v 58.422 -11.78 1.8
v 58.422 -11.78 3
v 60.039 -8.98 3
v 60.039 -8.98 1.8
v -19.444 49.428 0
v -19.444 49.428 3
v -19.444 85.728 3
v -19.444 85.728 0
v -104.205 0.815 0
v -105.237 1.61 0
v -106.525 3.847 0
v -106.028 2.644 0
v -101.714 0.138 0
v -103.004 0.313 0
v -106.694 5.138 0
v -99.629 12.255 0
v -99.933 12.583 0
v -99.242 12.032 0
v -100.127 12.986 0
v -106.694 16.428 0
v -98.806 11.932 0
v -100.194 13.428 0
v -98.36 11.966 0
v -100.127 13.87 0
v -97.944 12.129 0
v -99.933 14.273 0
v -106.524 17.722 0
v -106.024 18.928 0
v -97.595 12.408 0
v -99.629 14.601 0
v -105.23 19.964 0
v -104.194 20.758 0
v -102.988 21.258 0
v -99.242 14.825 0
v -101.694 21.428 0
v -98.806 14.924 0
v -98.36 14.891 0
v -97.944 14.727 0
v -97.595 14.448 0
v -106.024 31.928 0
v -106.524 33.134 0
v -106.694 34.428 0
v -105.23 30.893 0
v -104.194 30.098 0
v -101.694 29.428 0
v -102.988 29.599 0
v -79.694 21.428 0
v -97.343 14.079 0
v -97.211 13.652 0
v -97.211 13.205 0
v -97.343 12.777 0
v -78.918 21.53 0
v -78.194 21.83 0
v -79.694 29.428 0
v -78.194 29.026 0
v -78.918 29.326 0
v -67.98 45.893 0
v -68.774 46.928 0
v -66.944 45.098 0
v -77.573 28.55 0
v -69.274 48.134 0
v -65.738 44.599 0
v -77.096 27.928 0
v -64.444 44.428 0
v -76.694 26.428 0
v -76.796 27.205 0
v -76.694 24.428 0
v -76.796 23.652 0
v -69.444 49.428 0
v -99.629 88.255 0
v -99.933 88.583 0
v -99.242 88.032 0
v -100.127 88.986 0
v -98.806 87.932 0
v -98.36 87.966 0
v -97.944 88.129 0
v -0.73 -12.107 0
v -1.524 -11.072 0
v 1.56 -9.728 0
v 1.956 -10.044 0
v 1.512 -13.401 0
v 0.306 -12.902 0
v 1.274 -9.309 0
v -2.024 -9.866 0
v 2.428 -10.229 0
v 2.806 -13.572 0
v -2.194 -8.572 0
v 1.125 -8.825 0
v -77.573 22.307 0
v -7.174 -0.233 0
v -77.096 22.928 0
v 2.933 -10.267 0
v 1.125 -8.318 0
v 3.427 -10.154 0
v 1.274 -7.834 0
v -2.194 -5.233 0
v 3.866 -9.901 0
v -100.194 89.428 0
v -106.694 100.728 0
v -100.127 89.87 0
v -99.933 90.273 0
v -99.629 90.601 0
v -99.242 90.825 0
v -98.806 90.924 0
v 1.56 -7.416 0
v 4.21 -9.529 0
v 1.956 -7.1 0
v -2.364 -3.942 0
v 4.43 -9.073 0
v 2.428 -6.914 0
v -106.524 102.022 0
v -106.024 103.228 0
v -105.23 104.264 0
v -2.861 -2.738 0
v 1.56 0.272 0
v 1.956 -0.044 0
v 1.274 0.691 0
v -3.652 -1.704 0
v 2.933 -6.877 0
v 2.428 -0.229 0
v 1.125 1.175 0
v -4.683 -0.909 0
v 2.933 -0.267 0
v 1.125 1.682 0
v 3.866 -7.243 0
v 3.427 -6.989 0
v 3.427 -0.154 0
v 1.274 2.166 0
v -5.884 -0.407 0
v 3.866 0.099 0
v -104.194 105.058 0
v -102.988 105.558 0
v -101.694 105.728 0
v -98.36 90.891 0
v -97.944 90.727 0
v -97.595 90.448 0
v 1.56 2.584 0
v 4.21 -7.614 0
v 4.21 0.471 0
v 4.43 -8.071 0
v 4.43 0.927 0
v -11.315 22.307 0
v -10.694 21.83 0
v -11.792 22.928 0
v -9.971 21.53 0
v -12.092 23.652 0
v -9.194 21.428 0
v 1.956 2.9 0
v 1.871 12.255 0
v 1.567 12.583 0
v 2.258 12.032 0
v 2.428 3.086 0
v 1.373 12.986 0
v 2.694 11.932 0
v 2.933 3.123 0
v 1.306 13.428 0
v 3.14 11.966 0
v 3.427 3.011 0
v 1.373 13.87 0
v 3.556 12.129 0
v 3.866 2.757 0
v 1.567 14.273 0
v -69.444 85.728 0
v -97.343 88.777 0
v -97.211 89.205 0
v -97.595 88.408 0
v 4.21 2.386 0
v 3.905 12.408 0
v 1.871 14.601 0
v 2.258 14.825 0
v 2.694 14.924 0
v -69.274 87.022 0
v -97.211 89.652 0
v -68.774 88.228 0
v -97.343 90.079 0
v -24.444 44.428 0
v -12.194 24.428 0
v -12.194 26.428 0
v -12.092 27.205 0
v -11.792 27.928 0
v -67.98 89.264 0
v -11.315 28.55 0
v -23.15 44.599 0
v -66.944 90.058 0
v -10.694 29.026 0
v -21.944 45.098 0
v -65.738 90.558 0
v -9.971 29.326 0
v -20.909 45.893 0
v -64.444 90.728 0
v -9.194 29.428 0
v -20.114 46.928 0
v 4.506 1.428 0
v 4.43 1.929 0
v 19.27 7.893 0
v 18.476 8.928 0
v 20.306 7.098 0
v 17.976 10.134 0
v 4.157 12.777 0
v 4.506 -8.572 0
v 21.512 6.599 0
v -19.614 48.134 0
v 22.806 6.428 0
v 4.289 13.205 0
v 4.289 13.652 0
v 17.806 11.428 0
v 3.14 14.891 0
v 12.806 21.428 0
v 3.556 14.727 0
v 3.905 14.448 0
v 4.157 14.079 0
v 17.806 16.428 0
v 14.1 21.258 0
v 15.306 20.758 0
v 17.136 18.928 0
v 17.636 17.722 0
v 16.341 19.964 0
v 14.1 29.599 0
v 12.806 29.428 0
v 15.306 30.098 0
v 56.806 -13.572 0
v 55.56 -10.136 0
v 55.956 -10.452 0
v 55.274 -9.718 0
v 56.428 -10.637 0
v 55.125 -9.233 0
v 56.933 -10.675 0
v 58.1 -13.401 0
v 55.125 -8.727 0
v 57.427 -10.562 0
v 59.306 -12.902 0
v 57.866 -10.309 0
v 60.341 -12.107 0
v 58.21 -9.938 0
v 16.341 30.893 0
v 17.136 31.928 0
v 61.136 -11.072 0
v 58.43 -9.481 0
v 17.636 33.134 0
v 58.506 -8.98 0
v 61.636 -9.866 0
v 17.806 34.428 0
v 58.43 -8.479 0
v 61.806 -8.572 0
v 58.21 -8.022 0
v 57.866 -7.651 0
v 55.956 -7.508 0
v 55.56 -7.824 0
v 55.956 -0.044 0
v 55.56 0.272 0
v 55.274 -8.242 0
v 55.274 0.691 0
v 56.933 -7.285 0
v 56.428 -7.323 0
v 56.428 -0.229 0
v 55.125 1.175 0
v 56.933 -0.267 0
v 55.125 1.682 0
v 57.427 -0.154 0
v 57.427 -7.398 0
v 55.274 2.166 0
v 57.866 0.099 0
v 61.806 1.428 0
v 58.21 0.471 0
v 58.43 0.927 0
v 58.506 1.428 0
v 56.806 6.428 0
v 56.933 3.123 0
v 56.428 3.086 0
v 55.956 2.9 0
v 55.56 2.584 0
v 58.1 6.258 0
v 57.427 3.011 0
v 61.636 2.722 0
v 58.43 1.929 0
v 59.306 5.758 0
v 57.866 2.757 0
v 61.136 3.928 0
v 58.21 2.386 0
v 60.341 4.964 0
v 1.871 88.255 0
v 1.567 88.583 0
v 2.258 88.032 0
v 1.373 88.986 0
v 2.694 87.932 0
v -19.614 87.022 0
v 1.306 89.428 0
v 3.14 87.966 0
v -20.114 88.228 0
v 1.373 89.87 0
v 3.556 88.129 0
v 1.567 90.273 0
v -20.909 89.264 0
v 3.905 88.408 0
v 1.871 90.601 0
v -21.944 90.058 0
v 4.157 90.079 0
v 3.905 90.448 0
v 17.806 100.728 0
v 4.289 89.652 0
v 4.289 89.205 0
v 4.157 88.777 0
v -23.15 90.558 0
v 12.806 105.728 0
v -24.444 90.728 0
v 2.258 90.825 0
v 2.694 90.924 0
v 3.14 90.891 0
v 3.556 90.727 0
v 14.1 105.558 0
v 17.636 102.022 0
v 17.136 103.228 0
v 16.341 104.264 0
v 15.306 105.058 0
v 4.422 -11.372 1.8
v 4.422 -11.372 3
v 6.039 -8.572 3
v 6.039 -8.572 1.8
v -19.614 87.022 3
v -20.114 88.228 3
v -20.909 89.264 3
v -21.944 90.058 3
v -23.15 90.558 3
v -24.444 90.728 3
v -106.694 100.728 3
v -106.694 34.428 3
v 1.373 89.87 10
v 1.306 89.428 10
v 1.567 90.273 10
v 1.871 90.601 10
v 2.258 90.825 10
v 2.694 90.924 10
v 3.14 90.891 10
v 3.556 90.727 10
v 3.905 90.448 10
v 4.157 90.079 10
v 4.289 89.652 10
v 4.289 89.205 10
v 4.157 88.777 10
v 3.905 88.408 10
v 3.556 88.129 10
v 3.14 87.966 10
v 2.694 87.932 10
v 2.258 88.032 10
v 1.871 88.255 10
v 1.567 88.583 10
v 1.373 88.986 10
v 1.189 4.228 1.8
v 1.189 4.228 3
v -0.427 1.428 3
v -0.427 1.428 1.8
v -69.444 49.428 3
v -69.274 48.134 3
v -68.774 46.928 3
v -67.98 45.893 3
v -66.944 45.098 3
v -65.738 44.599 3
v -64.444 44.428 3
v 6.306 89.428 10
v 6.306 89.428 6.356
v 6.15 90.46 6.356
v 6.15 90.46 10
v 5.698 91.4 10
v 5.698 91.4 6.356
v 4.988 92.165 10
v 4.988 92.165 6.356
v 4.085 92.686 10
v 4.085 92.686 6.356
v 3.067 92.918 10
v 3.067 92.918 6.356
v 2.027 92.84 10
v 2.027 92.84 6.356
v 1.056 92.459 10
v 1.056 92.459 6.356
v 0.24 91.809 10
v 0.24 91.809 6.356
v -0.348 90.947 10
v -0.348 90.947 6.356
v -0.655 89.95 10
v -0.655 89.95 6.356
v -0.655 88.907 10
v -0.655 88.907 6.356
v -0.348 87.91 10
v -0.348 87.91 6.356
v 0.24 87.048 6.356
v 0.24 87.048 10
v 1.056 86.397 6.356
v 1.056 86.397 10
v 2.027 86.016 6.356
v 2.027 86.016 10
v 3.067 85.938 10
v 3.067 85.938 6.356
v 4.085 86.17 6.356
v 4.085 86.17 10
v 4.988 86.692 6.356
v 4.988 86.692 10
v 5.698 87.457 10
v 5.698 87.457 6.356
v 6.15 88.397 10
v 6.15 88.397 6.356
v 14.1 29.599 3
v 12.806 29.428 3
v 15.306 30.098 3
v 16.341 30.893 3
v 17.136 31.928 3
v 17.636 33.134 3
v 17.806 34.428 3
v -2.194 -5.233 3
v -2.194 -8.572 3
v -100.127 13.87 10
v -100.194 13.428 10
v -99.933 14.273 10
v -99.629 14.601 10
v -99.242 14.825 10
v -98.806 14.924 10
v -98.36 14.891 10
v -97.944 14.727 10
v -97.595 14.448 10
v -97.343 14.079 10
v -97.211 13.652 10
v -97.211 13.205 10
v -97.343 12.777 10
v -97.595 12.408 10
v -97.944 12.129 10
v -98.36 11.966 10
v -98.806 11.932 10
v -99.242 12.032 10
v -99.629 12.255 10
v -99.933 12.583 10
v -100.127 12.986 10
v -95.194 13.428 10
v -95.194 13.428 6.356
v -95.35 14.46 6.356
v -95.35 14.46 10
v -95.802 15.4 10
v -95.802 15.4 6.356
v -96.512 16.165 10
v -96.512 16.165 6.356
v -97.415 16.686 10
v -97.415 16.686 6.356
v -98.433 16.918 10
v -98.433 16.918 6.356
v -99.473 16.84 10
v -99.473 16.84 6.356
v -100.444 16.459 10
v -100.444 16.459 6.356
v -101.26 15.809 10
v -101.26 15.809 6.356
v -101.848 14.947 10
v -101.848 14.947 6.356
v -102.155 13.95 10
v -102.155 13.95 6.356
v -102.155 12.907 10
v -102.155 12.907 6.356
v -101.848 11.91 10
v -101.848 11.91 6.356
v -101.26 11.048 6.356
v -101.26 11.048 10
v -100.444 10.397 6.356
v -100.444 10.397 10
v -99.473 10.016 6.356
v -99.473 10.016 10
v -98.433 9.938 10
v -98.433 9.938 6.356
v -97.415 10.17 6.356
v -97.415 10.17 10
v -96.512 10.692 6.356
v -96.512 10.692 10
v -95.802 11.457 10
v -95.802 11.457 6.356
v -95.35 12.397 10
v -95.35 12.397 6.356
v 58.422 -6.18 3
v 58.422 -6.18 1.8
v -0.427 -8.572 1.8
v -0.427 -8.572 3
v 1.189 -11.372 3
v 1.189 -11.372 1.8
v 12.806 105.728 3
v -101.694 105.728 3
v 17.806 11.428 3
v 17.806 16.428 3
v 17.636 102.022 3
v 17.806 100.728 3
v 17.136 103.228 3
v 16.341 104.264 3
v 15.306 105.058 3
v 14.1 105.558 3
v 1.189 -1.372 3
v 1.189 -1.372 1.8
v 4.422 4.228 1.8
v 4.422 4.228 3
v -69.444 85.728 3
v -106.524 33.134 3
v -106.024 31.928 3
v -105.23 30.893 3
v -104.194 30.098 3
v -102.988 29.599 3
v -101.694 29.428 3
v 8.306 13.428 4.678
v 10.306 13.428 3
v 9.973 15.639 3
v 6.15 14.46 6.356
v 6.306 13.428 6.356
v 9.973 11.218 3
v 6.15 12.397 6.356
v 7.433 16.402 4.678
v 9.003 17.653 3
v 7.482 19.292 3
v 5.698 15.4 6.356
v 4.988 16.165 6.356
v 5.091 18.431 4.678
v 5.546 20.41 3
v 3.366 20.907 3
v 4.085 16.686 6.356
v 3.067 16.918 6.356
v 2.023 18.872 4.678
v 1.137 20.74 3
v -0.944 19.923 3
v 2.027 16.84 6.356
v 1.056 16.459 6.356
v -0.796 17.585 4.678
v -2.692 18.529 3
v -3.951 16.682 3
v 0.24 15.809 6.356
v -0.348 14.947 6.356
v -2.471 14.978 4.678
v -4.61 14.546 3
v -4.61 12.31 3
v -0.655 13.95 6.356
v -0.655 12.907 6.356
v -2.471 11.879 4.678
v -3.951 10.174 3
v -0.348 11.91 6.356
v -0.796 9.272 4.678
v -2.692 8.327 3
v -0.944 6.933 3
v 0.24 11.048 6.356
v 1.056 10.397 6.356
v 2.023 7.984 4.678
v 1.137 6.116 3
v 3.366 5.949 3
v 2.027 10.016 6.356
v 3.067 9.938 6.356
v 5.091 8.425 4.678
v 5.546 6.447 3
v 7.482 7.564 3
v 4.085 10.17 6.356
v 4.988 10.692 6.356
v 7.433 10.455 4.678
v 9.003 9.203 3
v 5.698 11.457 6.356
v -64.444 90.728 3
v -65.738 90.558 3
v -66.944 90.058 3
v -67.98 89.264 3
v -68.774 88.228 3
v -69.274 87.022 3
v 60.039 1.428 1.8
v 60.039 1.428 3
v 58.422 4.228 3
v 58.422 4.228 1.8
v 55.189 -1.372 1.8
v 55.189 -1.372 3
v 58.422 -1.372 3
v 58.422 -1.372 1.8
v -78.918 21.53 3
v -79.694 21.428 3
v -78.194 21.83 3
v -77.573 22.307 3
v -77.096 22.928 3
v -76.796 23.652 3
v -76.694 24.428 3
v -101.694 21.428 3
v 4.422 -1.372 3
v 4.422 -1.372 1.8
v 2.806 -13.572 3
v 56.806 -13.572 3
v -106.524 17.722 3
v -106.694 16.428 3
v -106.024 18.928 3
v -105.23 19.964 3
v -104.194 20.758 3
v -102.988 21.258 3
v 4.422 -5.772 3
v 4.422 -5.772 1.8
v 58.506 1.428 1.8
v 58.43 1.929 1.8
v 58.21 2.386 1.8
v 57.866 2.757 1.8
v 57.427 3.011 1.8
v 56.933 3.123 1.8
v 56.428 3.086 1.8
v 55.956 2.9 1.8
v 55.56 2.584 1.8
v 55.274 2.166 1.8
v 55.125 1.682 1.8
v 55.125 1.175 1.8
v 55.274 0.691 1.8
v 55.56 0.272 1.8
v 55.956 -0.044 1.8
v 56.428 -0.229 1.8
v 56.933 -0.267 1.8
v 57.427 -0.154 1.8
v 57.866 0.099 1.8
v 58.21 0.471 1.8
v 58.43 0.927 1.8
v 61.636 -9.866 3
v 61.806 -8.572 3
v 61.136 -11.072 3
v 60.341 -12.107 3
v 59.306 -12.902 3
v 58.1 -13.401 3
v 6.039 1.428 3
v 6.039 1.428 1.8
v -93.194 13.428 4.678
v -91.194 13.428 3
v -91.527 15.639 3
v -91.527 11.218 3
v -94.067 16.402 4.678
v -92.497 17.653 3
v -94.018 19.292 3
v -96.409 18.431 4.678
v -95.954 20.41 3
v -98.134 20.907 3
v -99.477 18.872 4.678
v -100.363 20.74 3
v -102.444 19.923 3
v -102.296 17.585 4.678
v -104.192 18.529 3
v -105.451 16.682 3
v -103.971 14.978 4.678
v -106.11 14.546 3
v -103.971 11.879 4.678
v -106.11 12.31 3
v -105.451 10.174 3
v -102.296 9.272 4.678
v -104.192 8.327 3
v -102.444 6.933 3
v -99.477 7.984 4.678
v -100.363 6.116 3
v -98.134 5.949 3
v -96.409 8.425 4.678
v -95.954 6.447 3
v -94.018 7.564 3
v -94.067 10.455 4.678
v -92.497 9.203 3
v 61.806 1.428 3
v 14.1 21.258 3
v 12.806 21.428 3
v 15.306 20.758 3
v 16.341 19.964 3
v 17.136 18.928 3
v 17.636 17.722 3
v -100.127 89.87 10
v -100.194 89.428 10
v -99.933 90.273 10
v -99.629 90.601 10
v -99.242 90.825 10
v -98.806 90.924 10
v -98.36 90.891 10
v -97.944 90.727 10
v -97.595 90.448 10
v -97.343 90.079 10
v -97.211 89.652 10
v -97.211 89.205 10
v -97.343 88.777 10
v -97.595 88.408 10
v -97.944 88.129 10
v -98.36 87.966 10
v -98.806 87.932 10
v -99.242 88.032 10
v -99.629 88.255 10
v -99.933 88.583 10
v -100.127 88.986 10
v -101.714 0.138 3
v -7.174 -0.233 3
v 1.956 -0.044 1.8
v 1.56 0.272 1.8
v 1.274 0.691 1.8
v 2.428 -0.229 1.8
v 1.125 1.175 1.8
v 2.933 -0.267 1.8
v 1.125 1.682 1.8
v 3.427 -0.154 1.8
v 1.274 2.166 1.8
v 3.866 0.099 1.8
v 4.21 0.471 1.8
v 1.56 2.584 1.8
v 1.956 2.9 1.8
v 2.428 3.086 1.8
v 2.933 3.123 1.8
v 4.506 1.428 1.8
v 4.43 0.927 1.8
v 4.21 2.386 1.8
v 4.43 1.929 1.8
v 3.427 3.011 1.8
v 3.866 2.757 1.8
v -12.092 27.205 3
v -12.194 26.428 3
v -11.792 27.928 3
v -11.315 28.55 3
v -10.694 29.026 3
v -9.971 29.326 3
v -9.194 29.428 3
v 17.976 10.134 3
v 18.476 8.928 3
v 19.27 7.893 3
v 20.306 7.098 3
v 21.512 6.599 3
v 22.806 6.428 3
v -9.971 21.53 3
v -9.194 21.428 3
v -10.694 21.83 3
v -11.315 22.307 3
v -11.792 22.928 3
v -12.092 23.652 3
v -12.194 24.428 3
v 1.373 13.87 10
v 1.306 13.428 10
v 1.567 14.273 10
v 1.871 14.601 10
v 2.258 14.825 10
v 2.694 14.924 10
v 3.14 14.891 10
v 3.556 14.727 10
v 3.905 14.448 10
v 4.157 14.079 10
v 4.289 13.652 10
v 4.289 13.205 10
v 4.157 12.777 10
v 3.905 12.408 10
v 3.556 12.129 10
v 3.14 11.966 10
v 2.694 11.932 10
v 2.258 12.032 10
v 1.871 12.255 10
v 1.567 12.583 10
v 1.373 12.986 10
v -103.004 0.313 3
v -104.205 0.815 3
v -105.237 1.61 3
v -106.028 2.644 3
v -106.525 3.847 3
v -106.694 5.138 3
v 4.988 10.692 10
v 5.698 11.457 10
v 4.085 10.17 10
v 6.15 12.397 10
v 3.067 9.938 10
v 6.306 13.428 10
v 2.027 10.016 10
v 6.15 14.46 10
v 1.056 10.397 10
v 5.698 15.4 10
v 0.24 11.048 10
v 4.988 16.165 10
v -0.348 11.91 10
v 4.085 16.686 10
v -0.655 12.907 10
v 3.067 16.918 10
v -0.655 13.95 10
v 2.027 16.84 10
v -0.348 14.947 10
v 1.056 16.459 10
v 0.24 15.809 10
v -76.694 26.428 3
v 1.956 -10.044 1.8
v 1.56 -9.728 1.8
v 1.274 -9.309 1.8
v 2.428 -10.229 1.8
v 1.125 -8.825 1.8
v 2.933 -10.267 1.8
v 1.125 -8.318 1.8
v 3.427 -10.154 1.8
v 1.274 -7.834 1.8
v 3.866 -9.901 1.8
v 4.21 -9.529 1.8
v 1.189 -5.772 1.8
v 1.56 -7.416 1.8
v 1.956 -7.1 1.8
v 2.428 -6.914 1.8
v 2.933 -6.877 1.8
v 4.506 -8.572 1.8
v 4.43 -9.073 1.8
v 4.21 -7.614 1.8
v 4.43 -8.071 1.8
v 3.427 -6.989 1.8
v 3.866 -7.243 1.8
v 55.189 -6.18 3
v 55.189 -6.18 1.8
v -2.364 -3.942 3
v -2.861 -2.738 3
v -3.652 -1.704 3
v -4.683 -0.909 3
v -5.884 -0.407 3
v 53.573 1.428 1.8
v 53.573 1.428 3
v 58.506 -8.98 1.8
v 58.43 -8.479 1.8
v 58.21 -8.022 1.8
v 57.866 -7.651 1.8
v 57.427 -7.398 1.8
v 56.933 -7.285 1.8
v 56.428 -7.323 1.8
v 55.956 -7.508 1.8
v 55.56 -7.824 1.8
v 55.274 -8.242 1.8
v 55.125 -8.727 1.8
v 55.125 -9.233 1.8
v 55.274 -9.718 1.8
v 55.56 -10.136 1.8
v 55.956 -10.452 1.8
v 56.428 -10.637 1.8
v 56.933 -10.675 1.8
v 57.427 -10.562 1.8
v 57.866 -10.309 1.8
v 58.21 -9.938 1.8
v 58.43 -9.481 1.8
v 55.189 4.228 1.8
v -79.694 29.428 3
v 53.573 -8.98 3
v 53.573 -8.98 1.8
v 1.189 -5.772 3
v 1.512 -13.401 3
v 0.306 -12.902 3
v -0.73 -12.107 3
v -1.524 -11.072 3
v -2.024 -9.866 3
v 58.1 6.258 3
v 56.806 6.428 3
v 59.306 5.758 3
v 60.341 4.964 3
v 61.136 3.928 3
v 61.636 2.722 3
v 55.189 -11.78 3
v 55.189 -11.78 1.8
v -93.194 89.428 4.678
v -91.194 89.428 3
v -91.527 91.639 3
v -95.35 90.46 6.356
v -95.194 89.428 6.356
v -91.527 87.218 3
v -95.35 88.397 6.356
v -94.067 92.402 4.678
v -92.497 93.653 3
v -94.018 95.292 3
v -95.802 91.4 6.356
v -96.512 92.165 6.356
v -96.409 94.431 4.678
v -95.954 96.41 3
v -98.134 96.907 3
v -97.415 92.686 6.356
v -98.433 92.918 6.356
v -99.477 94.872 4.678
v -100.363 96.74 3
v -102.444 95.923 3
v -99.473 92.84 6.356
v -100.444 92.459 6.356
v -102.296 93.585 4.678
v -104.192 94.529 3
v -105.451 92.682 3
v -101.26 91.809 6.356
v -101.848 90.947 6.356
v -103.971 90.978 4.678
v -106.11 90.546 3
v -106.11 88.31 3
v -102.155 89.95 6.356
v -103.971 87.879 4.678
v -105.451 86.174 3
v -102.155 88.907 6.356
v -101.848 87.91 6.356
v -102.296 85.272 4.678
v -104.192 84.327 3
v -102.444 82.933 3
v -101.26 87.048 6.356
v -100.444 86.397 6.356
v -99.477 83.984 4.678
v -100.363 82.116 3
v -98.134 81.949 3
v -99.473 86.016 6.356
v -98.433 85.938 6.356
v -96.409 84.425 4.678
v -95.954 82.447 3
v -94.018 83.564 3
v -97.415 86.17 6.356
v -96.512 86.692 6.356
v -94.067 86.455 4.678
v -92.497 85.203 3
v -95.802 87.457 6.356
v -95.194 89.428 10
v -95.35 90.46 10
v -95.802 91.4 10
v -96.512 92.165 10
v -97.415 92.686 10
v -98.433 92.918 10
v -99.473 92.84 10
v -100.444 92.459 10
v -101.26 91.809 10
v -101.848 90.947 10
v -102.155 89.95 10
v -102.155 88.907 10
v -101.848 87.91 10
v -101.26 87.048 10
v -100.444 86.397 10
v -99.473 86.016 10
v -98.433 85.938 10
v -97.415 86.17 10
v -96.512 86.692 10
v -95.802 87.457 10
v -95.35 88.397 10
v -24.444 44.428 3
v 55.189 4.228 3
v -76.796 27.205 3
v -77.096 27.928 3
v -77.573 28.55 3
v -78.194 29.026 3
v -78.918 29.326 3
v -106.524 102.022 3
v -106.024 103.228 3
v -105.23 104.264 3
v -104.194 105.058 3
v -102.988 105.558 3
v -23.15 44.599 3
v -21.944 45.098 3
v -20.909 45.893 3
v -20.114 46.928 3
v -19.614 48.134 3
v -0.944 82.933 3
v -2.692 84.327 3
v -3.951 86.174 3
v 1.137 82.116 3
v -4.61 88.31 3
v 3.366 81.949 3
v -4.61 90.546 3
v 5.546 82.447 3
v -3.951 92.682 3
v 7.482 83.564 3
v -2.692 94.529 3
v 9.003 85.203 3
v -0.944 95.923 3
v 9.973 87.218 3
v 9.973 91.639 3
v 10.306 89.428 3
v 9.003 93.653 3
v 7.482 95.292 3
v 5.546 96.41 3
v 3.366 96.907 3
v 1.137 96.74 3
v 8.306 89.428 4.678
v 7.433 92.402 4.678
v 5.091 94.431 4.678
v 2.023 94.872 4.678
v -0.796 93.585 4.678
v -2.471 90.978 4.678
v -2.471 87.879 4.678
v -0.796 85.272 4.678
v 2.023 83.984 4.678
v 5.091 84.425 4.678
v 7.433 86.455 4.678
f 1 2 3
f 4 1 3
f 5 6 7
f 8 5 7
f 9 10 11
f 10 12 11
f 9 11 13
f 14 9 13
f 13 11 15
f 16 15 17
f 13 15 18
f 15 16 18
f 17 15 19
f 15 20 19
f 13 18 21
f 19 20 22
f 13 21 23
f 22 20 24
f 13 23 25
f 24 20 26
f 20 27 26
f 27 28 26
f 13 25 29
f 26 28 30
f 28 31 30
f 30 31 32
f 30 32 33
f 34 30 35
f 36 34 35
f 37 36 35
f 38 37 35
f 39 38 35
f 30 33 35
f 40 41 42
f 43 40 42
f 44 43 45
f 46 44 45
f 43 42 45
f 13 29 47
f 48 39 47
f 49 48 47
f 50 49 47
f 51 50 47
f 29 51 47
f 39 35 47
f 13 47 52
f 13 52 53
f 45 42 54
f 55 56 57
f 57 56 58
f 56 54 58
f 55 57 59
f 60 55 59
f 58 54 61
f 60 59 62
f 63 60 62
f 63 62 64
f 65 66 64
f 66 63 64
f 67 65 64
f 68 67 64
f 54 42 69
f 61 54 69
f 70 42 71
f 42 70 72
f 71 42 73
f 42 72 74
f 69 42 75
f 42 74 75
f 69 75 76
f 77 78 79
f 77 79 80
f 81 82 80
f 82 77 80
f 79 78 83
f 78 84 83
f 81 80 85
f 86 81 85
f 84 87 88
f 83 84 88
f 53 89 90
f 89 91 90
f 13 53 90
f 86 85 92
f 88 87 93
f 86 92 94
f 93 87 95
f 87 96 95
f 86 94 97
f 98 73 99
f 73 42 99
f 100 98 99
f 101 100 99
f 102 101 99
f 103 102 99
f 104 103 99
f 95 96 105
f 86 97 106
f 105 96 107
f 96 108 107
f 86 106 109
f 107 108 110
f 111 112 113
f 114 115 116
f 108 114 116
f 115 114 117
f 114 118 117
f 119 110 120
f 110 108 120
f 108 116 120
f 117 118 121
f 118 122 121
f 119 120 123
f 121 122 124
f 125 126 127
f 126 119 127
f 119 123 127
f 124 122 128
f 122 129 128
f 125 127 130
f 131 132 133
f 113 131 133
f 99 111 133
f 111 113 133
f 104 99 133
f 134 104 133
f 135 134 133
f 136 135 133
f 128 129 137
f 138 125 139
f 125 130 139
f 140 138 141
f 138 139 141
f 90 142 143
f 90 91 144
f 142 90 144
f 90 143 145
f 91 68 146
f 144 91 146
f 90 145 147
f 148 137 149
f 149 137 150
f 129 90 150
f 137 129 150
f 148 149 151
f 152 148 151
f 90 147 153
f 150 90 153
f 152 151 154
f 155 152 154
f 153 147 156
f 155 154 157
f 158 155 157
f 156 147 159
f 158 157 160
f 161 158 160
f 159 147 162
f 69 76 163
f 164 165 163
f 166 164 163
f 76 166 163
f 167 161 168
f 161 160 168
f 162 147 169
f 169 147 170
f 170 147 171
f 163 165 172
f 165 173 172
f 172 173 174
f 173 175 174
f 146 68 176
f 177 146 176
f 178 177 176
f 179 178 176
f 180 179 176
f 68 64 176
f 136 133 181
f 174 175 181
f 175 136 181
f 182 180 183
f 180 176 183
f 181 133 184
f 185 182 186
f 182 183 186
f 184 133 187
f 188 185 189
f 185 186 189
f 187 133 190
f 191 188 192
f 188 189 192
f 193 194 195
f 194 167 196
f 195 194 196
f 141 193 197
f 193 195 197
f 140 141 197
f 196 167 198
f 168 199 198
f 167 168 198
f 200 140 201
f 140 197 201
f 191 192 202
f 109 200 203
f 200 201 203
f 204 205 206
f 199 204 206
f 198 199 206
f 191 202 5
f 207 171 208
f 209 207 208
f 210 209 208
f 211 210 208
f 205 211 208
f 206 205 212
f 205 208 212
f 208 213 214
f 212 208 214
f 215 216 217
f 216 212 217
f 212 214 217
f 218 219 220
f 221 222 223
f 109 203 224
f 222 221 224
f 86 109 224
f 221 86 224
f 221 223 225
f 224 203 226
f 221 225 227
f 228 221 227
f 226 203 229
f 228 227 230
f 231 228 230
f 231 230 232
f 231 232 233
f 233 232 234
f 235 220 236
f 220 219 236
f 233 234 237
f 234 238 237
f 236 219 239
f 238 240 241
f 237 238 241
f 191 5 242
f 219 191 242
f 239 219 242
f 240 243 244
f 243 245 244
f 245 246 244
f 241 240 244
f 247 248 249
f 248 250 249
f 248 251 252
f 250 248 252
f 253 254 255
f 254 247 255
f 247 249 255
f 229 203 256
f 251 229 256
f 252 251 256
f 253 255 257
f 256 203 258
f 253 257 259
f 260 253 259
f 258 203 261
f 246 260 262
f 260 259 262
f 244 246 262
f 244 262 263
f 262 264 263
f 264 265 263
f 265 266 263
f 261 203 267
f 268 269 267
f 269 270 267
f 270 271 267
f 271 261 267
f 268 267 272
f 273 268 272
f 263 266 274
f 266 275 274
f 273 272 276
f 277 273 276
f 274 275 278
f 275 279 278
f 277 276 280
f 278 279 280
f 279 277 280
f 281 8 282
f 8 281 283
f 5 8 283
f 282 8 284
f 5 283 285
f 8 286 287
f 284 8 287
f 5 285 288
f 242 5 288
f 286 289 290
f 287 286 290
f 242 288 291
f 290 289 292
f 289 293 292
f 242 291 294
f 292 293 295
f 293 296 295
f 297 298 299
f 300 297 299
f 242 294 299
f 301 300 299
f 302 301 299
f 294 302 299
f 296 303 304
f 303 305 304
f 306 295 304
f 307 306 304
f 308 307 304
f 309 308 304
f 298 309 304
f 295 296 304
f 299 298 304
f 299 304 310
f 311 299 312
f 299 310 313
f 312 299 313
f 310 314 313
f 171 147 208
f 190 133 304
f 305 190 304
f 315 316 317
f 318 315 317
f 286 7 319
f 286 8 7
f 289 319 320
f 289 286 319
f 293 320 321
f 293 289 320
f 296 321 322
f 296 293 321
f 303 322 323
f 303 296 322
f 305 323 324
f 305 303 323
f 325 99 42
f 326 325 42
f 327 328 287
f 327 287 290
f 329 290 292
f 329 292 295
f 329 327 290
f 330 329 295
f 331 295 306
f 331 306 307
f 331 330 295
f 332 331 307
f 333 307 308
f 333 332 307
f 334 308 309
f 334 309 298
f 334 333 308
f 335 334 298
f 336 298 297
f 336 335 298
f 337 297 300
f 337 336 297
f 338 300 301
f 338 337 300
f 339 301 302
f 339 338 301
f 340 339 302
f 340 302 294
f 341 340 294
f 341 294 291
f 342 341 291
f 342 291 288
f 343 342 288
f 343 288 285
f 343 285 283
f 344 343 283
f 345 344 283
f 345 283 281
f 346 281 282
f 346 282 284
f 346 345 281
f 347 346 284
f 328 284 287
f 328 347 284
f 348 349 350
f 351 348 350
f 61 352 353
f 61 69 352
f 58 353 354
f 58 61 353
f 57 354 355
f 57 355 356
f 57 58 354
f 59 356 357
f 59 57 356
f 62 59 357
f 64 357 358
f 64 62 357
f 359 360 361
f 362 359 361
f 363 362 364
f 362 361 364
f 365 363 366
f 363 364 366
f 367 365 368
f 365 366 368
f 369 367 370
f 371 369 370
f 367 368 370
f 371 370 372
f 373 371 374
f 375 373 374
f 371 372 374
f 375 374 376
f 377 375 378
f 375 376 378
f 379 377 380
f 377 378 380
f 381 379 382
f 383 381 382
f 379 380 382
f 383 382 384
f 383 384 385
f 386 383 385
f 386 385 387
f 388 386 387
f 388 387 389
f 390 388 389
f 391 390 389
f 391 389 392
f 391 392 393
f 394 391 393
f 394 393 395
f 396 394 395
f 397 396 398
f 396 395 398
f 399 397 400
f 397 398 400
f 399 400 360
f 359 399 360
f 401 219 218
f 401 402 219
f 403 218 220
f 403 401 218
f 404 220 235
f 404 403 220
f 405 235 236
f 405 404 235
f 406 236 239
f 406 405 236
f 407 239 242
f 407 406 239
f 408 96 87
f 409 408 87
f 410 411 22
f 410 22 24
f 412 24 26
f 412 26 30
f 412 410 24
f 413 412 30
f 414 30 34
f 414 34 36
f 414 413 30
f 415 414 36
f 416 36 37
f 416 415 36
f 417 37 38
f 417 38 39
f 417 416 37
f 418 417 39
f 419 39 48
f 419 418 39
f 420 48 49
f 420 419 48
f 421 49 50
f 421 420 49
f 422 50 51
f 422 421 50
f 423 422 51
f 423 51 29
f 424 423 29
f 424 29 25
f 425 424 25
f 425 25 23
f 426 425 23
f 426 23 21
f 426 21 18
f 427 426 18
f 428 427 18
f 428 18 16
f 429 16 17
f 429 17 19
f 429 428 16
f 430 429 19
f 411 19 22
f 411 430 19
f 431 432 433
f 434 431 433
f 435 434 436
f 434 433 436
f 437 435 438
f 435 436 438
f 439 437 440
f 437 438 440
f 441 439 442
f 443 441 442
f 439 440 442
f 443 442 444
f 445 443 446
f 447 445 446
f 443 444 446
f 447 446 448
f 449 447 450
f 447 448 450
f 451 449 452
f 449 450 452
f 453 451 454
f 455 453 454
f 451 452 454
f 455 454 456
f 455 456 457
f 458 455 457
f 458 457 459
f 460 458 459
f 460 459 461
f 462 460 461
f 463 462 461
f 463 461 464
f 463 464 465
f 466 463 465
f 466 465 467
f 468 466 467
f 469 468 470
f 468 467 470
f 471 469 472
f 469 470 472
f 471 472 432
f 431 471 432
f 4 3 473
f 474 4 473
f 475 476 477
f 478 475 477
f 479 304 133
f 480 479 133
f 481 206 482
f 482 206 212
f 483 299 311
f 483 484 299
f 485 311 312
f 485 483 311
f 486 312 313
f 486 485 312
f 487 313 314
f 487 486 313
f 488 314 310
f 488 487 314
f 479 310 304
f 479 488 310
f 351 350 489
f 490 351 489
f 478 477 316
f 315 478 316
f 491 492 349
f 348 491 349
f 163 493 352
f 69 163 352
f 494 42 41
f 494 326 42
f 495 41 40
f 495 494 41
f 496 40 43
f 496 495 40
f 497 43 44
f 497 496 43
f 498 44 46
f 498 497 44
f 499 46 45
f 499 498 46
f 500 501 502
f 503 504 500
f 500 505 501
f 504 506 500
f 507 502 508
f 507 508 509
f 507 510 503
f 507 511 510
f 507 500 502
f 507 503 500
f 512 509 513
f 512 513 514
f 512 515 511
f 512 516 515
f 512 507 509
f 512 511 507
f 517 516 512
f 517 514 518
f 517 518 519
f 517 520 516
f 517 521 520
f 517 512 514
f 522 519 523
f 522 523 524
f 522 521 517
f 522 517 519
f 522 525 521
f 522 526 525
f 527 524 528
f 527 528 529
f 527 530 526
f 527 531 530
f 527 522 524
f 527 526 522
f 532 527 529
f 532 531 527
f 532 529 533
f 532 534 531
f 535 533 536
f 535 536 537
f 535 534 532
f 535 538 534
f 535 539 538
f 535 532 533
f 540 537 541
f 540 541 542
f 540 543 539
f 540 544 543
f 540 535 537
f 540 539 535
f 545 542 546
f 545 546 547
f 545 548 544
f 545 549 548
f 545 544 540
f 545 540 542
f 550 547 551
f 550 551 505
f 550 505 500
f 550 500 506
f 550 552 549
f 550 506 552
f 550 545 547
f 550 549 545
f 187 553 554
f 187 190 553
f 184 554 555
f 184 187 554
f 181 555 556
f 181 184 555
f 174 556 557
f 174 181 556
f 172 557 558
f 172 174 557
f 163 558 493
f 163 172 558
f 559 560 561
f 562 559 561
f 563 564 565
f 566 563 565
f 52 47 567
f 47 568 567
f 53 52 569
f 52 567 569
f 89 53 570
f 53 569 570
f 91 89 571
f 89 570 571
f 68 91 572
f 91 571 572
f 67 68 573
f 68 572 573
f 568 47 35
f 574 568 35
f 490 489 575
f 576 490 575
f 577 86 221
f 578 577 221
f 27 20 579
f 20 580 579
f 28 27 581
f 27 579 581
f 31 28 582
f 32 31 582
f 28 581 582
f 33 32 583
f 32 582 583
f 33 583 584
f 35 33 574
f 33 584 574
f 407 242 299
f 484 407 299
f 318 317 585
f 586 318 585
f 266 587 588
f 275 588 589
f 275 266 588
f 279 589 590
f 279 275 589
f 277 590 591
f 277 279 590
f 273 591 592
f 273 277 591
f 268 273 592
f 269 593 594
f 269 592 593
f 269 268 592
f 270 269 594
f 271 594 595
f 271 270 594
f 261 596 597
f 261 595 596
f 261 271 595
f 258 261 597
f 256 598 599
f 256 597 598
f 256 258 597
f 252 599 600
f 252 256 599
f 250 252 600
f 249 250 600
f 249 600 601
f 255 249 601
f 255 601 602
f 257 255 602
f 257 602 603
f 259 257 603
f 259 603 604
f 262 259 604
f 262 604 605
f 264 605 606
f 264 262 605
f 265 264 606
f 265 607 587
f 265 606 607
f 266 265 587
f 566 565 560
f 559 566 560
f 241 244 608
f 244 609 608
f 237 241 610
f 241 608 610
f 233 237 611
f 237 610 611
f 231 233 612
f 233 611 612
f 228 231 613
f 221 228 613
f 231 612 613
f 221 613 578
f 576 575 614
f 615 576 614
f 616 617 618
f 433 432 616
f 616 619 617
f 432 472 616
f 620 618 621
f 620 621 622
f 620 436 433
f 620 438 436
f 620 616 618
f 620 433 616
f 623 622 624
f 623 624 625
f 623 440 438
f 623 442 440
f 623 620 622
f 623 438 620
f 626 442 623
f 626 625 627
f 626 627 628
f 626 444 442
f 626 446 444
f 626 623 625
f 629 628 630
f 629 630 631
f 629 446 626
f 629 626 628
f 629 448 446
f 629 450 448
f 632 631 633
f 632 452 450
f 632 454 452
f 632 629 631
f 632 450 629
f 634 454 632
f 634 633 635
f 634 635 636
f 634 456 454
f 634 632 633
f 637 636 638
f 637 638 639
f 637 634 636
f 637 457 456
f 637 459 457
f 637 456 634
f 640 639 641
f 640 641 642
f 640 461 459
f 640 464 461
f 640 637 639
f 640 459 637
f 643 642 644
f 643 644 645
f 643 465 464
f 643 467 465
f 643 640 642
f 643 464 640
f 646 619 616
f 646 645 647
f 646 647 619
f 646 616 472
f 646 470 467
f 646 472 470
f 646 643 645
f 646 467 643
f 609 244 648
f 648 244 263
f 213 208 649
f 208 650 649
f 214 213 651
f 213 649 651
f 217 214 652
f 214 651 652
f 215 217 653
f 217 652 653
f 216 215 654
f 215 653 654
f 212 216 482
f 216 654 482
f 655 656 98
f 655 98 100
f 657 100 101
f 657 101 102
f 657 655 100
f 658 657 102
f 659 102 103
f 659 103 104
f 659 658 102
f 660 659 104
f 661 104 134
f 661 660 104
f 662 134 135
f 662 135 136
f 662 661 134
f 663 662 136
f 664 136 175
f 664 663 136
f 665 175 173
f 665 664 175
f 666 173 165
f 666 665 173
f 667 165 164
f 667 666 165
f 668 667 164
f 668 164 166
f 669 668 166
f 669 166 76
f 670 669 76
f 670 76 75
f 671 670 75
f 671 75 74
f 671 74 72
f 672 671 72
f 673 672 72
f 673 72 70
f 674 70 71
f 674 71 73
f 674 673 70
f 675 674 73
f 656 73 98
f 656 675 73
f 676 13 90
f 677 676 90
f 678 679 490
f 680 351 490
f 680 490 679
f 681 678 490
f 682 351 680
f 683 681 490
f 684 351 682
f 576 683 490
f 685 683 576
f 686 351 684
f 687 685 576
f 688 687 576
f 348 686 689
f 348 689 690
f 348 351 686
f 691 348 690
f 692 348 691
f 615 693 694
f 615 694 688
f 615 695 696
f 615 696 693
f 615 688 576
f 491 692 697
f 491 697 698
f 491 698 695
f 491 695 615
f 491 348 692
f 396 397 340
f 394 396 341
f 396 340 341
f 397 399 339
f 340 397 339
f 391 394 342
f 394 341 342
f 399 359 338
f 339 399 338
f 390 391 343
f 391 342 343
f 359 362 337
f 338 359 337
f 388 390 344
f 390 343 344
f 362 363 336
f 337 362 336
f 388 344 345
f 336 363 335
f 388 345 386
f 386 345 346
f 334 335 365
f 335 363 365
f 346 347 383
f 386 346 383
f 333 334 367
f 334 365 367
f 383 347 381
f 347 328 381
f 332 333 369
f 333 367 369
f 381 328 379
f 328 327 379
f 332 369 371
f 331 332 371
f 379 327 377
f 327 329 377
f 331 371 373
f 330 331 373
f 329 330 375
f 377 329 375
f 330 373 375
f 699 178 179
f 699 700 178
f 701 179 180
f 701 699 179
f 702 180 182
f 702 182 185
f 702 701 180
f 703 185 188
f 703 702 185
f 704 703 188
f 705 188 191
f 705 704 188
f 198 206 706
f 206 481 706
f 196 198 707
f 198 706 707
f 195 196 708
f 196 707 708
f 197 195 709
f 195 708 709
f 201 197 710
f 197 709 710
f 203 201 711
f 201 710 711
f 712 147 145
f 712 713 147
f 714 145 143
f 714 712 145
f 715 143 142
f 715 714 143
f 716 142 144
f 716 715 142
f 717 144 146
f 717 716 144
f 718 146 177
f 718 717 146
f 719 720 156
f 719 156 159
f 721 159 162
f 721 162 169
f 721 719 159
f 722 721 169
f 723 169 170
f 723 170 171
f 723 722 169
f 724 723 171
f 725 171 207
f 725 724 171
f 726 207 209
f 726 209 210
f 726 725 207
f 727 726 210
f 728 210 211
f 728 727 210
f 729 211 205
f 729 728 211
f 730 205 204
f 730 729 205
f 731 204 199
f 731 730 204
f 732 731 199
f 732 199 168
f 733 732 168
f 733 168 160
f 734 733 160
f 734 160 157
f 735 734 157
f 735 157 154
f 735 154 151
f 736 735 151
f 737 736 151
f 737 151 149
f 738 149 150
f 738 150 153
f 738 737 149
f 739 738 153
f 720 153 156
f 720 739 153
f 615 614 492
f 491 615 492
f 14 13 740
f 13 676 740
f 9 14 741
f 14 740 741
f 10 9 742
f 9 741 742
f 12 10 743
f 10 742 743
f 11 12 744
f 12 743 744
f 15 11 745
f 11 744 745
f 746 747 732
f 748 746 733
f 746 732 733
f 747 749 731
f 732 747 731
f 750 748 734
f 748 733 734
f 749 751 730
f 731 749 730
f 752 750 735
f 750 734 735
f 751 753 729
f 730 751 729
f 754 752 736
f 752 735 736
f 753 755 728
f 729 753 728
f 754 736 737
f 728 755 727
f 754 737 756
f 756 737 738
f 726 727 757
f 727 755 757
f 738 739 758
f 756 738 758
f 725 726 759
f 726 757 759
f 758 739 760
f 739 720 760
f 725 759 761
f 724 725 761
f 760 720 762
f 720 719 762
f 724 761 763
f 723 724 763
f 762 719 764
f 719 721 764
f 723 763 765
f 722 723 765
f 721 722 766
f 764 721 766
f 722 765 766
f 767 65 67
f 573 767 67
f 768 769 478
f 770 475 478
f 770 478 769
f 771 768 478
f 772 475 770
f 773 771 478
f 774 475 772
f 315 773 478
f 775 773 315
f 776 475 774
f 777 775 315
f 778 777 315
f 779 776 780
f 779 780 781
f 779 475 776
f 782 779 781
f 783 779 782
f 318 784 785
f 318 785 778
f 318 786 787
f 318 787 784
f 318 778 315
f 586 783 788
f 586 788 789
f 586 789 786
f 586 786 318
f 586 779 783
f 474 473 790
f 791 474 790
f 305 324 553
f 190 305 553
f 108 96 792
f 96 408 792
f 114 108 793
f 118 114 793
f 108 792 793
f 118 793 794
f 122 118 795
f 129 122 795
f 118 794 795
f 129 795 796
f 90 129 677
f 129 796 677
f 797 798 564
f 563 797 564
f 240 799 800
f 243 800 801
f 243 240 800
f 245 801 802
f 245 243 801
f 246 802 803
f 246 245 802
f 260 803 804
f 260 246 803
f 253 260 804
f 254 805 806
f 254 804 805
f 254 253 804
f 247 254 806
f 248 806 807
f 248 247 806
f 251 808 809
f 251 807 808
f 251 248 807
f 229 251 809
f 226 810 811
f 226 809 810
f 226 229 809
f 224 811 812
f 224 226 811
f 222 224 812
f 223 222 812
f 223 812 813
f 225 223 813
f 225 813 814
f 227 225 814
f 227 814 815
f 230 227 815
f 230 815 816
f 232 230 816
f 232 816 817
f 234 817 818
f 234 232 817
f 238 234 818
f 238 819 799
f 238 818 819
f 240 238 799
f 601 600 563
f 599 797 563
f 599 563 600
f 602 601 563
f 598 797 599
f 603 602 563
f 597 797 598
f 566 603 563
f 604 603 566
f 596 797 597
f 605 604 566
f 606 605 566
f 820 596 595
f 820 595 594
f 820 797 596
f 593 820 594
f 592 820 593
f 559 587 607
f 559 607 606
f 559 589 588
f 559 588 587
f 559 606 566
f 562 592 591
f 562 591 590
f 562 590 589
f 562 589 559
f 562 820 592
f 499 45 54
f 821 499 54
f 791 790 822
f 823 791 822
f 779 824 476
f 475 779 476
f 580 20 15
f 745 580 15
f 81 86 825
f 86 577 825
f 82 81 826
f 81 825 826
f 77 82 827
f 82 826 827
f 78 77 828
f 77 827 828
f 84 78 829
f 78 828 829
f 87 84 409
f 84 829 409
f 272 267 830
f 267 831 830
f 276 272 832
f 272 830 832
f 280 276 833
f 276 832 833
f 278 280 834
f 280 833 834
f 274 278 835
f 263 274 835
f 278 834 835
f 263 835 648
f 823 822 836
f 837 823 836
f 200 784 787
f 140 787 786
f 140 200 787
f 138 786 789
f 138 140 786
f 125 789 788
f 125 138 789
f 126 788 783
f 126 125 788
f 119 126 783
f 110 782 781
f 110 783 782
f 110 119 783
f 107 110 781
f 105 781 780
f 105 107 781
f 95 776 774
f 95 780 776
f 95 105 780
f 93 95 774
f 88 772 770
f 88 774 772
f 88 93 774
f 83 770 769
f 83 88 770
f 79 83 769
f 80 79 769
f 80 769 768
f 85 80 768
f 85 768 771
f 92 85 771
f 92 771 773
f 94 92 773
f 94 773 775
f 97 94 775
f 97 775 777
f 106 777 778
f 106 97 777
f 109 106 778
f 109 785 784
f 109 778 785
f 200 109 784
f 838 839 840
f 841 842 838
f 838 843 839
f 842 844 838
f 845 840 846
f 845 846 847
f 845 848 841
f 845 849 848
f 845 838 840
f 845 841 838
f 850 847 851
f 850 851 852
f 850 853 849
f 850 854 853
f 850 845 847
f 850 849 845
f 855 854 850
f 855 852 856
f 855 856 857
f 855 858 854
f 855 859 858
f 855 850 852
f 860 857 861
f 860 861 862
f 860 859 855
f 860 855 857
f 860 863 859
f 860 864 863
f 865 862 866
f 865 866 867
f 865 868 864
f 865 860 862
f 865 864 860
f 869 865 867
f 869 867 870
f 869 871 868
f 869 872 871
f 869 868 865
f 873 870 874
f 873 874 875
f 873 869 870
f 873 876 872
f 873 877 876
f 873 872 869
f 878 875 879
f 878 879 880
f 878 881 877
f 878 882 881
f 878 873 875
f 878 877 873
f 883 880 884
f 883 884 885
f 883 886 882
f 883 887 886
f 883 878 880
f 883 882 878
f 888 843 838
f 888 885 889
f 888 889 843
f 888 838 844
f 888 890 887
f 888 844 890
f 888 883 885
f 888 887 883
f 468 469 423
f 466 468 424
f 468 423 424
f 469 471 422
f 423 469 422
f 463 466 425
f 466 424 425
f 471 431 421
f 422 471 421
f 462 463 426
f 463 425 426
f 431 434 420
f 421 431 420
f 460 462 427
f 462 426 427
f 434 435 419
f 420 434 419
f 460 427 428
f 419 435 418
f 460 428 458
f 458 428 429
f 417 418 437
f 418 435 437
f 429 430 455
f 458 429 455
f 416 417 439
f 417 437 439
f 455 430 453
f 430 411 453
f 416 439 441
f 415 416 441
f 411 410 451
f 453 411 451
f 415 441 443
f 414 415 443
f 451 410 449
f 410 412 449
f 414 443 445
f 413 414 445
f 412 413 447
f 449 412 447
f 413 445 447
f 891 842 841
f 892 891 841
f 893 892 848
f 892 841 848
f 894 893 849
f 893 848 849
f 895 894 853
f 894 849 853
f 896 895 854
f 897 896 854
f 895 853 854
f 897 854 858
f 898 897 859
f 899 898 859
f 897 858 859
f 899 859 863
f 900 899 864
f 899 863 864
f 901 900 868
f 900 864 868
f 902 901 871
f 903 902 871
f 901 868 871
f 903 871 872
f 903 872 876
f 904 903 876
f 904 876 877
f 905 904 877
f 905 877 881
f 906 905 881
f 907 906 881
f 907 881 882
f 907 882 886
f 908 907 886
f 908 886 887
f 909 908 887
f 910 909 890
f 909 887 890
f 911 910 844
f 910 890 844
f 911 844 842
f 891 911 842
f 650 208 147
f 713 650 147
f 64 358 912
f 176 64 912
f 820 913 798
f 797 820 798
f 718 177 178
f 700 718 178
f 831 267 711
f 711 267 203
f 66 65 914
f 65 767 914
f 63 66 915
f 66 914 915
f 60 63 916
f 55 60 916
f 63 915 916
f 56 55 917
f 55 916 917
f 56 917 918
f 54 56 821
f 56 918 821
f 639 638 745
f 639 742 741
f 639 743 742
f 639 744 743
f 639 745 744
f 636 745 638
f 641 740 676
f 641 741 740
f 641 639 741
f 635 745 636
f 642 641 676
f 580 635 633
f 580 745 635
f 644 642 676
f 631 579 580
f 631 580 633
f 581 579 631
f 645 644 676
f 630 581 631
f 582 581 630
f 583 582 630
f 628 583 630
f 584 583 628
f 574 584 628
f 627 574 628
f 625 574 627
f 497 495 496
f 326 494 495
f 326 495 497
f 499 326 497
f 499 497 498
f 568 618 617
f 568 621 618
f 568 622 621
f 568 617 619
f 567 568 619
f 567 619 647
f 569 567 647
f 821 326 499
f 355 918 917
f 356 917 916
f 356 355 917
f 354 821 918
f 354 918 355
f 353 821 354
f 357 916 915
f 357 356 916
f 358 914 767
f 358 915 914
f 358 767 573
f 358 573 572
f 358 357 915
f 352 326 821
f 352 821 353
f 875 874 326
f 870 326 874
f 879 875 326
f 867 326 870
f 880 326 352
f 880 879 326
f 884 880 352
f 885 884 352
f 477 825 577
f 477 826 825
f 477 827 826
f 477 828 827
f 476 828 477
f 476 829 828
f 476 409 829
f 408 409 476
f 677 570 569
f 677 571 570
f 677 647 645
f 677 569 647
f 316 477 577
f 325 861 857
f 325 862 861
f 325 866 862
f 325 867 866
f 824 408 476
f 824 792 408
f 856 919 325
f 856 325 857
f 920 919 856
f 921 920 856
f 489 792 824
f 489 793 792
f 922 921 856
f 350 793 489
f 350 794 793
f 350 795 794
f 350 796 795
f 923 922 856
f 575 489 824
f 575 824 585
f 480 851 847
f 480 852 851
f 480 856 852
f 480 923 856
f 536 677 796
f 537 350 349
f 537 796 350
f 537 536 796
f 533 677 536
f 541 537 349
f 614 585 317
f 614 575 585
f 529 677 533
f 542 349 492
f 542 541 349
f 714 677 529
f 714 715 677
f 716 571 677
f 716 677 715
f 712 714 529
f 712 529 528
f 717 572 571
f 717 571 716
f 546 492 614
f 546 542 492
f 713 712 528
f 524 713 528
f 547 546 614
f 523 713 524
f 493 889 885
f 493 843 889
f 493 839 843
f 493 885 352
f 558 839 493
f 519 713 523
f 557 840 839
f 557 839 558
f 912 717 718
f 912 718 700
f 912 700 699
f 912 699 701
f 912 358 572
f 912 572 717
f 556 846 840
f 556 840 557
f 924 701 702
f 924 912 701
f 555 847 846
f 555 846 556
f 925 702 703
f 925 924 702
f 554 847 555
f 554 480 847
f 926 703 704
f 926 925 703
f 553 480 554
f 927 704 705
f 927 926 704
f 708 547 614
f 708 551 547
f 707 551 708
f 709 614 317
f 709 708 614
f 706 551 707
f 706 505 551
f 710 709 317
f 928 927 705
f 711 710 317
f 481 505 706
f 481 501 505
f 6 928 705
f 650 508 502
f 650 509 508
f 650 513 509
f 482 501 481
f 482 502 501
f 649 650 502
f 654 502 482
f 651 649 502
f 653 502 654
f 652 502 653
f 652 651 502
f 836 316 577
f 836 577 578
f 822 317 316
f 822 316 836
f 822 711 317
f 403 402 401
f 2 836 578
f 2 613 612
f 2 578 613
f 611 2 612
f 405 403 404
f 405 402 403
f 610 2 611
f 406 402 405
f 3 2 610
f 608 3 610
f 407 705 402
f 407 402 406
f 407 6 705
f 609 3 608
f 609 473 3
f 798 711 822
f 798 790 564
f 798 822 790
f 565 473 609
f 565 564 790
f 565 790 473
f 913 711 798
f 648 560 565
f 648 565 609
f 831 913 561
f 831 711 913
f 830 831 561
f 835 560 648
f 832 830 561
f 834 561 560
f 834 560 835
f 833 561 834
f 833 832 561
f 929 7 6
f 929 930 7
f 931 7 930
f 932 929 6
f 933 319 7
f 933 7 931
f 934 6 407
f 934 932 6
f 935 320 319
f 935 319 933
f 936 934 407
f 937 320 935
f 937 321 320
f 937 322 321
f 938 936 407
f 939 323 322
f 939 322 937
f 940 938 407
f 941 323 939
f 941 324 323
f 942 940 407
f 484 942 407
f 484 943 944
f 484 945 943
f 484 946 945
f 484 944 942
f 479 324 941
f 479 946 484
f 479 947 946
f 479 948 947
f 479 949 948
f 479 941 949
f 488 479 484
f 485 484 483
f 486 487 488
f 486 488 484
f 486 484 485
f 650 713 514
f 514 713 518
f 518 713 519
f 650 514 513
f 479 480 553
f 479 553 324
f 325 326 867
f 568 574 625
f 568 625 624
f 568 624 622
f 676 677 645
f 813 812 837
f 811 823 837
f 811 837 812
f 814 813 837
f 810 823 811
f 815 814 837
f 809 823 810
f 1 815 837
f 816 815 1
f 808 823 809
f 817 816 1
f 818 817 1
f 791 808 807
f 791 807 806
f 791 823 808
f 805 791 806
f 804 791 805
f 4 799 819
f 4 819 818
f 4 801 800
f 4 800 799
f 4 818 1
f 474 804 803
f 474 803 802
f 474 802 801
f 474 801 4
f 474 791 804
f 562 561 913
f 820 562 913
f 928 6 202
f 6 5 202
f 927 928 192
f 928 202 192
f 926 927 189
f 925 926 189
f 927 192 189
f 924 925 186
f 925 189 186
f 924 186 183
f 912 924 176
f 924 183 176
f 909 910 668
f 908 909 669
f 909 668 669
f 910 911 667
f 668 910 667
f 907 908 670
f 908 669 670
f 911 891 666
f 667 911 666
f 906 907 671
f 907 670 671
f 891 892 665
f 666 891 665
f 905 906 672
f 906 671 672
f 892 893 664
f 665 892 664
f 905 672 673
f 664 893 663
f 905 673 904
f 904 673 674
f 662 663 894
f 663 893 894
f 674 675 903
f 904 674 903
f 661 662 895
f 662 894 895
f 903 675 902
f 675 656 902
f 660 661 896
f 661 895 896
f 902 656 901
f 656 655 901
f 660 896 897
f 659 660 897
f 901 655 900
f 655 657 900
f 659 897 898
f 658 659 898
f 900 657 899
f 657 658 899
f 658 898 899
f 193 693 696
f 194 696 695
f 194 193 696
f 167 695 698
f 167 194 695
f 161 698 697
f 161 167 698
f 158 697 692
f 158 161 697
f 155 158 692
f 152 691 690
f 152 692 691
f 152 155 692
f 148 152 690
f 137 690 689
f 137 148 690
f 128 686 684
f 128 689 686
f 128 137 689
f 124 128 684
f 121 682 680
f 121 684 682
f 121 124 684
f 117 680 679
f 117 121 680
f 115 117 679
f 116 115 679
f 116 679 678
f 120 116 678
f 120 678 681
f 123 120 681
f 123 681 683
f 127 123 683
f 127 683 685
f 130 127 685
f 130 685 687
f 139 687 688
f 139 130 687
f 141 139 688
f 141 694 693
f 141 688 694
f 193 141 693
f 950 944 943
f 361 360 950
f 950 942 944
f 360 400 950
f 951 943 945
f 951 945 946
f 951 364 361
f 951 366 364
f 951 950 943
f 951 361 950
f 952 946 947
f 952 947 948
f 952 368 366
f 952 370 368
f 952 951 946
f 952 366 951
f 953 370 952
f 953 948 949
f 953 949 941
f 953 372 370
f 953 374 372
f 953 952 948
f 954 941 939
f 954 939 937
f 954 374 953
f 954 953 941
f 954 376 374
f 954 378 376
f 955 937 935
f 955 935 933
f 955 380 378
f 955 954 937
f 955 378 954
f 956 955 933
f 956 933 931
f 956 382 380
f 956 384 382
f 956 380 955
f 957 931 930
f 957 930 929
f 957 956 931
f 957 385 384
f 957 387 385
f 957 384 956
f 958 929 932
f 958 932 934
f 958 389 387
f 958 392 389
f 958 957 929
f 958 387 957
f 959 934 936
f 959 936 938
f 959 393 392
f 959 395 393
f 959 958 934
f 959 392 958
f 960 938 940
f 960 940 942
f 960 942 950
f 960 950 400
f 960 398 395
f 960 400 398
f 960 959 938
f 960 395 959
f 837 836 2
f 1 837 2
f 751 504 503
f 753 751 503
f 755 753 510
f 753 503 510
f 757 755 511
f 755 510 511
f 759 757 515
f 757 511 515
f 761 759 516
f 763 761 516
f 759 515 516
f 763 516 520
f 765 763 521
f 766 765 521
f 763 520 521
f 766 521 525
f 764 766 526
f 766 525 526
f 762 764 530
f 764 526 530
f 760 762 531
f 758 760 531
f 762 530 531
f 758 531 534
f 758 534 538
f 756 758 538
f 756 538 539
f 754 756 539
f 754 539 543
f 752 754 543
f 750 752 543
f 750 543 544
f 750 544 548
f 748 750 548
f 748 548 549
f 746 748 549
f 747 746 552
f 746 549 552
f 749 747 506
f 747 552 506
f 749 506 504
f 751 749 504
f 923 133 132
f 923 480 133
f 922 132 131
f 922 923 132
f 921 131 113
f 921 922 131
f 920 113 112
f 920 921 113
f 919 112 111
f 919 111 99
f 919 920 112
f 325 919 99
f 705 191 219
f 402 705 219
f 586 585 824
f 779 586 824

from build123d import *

# Parameters (mm, degrees)
EXTRUDE_1_OUTLINE_R = 1.7
EXTRUDE_1_DEPTH     = 3
FILLET_1_R          = 3
FILLET_2_R          = 5
SKETCH_2_R          = 3.5
EXTRUDE_2_DEPTH     = 7
CHAMFER_1_SIZE      = 4
CHAMFER_1_SIZE2     = 3.356398525
SKETCH_3_R          = 1.6
CUT_EXTRUDE_1_DEPTH = 50
CUT_EXTRUDE_2_DEPTH = 1.2
CUT_EXTRUDE_3_DEPTH = 10
FILLET_3_R          = 5
EXTRUDE_START       = -10
SKETCH_6_R          = 2.5
SKETCH_6_R_2        = 1.5
EXTRUDE_1_2_DEPTH   = 10


# Read off the part's stored shape, not the designer's step: 보스-돌출1
with BuildPart() as part:
    # Extrude 1 outline → Extrude 1 (new body)
    with BuildSketch(Plane.XY):
        Polygon((61.805886205, -13.571810541), (61.805886205, 6.428189459), (17.805886205, 6.428189459), (17.805886205, 21.428189459), (-12.194113795, 21.428189459), (-12.194113795, 29.428189459), (17.805886205, 29.428189459), (17.805886205, 105.728189459), (-106.694113795, 105.728189459), (-106.694113795, 29.428189459), (-76.694113795, 29.428189459), (-76.694113795, 21.428189459), (-106.694113795, 21.428189459), (-106.694113795, 0.157968071), (-2.194113795, -0.252198443), (-2.194113795, -13.571810541), align=None)
        with Locations((-98.694113795, 13.428189459)):
            Circle(EXTRUDE_1_OUTLINE_R, mode=Mode.SUBTRACT)
        with Locations((2.805886205, -8.571810541)):
            Circle(EXTRUDE_1_OUTLINE_R, mode=Mode.SUBTRACT)
        with Locations((2.805886205, 1.428189459)):
            Circle(EXTRUDE_1_OUTLINE_R, mode=Mode.SUBTRACT)
        with Locations((2.805886205, 13.428189459)):
            Circle(EXTRUDE_1_OUTLINE_R, mode=Mode.SUBTRACT)
        with Locations((56.805886205, -8.979991995)):
            Circle(EXTRUDE_1_OUTLINE_R, mode=Mode.SUBTRACT)
        with Locations((56.805886205, 1.428189459)):
            Circle(EXTRUDE_1_OUTLINE_R, mode=Mode.SUBTRACT)
        with Locations((-98.694113795, 89.428189459)):
            Circle(EXTRUDE_1_OUTLINE_R, mode=Mode.SUBTRACT)
        with Locations((2.805886205, 89.428189459)):
            Circle(EXTRUDE_1_OUTLINE_R, mode=Mode.SUBTRACT)
    extrude(amount=EXTRUDE_1_DEPTH)

    # 필렛1
    fillet_1_edges = [part.edges().sort_by_distance(p)[0] for p in [
        (-76.694113795, 21.428189459, 1.5),
        (-76.694113795, 29.428189459, 1.5),
        (-12.194113795, 29.428189459, 1.5),
        (-12.194113795, 21.428189459, 1.5),
    ]]
    fillet(fillet_1_edges, radius=FILLET_1_R)

    # 필렛2
    fillet_2_edges = [part.edges().sort_by_distance(p)[0] for p in [
        (61.805886205, 6.428189459, 1.5),
        (61.805886205, -13.571810541, 1.5),
        (-2.194113795, -13.571810541, 1.5),
        (-2.194113795, -0.252198443, 1.5),
        (-106.694113795, 0.157968071, 1.5),
        (-106.694113795, 21.428189459, 1.5),
        (-106.694113795, 29.428189459, 1.5),
        (-106.694113795, 105.728189459, 1.5),
        (17.805886205, 105.728189459, 1.5),
        (17.805886205, 29.428189459, 1.5),
        (17.805886205, 21.428189459, 1.5),
        (17.805886205, 6.428189459, 1.5),
    ]]
    fillet(fillet_2_edges, radius=FILLET_2_R)

    # 스케치2 → 보스-돌출2 (add)
    with BuildSketch(Plane.XY.offset(3)):
        with Locations((-98.694113795, 89.428189459)):
            Circle(SKETCH_2_R)
        with Locations((2.805886205, 89.428189459)):
            Circle(SKETCH_2_R)
        with Locations((-98.694113795, 13.428189459)):
            Circle(SKETCH_2_R)
        with Locations((2.805886205, 13.428189459)):
            Circle(SKETCH_2_R)
    extrude(amount=EXTRUDE_2_DEPTH)

    # 모따기1
    chamfer_1_edges = [part.edges().sort_by_distance(p)[0] for p in [
        (-102.194113795, 89.428189459, 3),
        (-0.694113795, 89.428189459, 3),
        (-102.194113795, 13.428189459, 3),
        (-0.694113795, 13.428189459, 3),
    ]]
    chamfer_1_side = [part.faces().sort_by_distance(p)[0] for p in [
        (-38.126255905, 49.180268575, 3),
    ]]
    chamfer(chamfer_1_edges, length=CHAMFER_1_SIZE, length2=CHAMFER_1_SIZE2, reference=chamfer_1_side[0])

    # 스케치3 → 컷-돌출1 (cut)
    with BuildSketch(Plane(origin=(0, 0, 0), x_dir=(-1, 0, 0), z_dir=(0, 0, -1))):
        with Locations(Location((-2.805886205, 89.428189459, 0), (0, 0, 180))):
            Circle(SKETCH_3_R)
        with Locations(Location((-2.805886205, 13.428189459, 0), (0, 0, 180))):
            Circle(SKETCH_3_R)
        with Locations(Location((98.694113795, 13.428189459, 0), (0, 0, 180))):
            Circle(SKETCH_3_R)
        with Locations(Location((98.694113795, 89.428189459, 0), (0, 0, 180))):
            Circle(SKETCH_3_R)
    extrude(amount=-CUT_EXTRUDE_1_DEPTH, mode=Mode.SUBTRACT)

    # 스케치4 → 컷-돌출2 (cut)
    with BuildSketch(Plane.XY.offset(3)):
        Polygon((6.039047712, 1.428189459), (4.422466959, 4.228189459), (1.189305451, 4.228189459), (-0.427275303, 1.428189459), (1.189305451, -1.371810541), (4.422466959, -1.371810541), align=None)
        Polygon((6.039047712, -8.571810541), (4.422466959, -5.771810541), (1.189305451, -5.771810541), (-0.427275303, -8.571810541), (1.189305451, -11.371810541), (4.422466959, -11.371810541), align=None)
        Polygon((53.572724697, 1.428189459), (55.189305451, -1.371810541), (58.422466959, -1.371810541), (60.039047712, 1.428189459), (58.422466959, 4.228189459), (55.189305451, 4.228189459), align=None)
        Polygon((53.572724697, -8.979991995), (55.189305451, -11.779991995), (58.422466959, -11.779991995), (60.039047712, -8.979991995), (58.422466959, -6.179991995), (55.189305451, -6.179991995), align=None)
    extrude(amount=-CUT_EXTRUDE_2_DEPTH, mode=Mode.SUBTRACT)

    # 스케치5 → 컷-돌출3 (cut)
    with BuildSketch(Plane.XY.offset(3)):
        Polygon((-44.444113795, 90.728189459), (-44.444113795, 52.86409473), (-34.510431855, 44.428189459), (-19.444113795, 44.428189459), (-19.444113795, 90.728189459), align=None)
        Polygon((-69.444113795, 90.728189459), (-69.444113795, 74.094654862), (-44.444113795, 52.86409473), (-44.444113795, 90.728189459), align=None)
        Polygon((-44.444113795, 52.86409473), (-69.444113795, 74.094654862), (-69.444113795, 44.428189459), (-34.510431855, 44.428189459), align=None)
    extrude(amount=-CUT_EXTRUDE_3_DEPTH, mode=Mode.SUBTRACT)

    # 필렛3
    fillet_3_edges = [part.edges().sort_by_distance(p)[0] for p in [
        (-19.444113795, 90.728189459, 1.5),
        (-19.444113795, 44.428189459, 1.5),
        (-69.444113795, 44.428189459, 1.5),
        (-69.444113795, 90.728189459, 1.5),
    ]]
    fillet(fillet_3_edges, radius=FILLET_3_R)

    # 스케치6 → Extrude 1 2 (add)
    # profile 1 of 4: a face of its own
    with BuildSketch(Plane(origin=(0, 0, 0), x_dir=(-1, 0, 0), z_dir=(0, 0, -1)).offset(EXTRUDE_START)):
        with Locations((-2.805886205, 89.428189459)):
            Circle(SKETCH_6_R)
        with Locations((-2.805886205, 89.428189459)):
            Circle(SKETCH_6_R_2, mode=Mode.SUBTRACT)
    # profile 2 of 4: a face of its own
    with BuildSketch(Plane(origin=(0, 0, 0), x_dir=(-1, 0, 0), z_dir=(0, 0, -1)).offset(EXTRUDE_START)):
        with Locations((-2.805886205, 13.428189459)):
            Circle(SKETCH_6_R)
        with Locations((-2.805886205, 13.428189459)):
            Circle(SKETCH_6_R_2, mode=Mode.SUBTRACT)
    # profile 3 of 4: a face of its own
    with BuildSketch(Plane(origin=(0, 0, 0), x_dir=(-1, 0, 0), z_dir=(0, 0, -1)).offset(EXTRUDE_START)):
        with Locations((98.694113795, 13.428189459)):
            Circle(SKETCH_6_R)
        with Locations((98.694113795, 13.428189459)):
            Circle(SKETCH_6_R_2, mode=Mode.SUBTRACT)
    # profile 4 of 4: a face of its own
    with BuildSketch(Plane(origin=(0, 0, 0), x_dir=(-1, 0, 0), z_dir=(0, 0, -1)).offset(EXTRUDE_START)):
        with Locations((98.694113795, 89.428189459)):
            Circle(SKETCH_6_R)
        with Locations((98.694113795, 89.428189459)):
            Circle(SKETCH_6_R_2, mode=Mode.SUBTRACT)
    extrude(amount=EXTRUDE_1_2_DEPTH)


solid = part.part
